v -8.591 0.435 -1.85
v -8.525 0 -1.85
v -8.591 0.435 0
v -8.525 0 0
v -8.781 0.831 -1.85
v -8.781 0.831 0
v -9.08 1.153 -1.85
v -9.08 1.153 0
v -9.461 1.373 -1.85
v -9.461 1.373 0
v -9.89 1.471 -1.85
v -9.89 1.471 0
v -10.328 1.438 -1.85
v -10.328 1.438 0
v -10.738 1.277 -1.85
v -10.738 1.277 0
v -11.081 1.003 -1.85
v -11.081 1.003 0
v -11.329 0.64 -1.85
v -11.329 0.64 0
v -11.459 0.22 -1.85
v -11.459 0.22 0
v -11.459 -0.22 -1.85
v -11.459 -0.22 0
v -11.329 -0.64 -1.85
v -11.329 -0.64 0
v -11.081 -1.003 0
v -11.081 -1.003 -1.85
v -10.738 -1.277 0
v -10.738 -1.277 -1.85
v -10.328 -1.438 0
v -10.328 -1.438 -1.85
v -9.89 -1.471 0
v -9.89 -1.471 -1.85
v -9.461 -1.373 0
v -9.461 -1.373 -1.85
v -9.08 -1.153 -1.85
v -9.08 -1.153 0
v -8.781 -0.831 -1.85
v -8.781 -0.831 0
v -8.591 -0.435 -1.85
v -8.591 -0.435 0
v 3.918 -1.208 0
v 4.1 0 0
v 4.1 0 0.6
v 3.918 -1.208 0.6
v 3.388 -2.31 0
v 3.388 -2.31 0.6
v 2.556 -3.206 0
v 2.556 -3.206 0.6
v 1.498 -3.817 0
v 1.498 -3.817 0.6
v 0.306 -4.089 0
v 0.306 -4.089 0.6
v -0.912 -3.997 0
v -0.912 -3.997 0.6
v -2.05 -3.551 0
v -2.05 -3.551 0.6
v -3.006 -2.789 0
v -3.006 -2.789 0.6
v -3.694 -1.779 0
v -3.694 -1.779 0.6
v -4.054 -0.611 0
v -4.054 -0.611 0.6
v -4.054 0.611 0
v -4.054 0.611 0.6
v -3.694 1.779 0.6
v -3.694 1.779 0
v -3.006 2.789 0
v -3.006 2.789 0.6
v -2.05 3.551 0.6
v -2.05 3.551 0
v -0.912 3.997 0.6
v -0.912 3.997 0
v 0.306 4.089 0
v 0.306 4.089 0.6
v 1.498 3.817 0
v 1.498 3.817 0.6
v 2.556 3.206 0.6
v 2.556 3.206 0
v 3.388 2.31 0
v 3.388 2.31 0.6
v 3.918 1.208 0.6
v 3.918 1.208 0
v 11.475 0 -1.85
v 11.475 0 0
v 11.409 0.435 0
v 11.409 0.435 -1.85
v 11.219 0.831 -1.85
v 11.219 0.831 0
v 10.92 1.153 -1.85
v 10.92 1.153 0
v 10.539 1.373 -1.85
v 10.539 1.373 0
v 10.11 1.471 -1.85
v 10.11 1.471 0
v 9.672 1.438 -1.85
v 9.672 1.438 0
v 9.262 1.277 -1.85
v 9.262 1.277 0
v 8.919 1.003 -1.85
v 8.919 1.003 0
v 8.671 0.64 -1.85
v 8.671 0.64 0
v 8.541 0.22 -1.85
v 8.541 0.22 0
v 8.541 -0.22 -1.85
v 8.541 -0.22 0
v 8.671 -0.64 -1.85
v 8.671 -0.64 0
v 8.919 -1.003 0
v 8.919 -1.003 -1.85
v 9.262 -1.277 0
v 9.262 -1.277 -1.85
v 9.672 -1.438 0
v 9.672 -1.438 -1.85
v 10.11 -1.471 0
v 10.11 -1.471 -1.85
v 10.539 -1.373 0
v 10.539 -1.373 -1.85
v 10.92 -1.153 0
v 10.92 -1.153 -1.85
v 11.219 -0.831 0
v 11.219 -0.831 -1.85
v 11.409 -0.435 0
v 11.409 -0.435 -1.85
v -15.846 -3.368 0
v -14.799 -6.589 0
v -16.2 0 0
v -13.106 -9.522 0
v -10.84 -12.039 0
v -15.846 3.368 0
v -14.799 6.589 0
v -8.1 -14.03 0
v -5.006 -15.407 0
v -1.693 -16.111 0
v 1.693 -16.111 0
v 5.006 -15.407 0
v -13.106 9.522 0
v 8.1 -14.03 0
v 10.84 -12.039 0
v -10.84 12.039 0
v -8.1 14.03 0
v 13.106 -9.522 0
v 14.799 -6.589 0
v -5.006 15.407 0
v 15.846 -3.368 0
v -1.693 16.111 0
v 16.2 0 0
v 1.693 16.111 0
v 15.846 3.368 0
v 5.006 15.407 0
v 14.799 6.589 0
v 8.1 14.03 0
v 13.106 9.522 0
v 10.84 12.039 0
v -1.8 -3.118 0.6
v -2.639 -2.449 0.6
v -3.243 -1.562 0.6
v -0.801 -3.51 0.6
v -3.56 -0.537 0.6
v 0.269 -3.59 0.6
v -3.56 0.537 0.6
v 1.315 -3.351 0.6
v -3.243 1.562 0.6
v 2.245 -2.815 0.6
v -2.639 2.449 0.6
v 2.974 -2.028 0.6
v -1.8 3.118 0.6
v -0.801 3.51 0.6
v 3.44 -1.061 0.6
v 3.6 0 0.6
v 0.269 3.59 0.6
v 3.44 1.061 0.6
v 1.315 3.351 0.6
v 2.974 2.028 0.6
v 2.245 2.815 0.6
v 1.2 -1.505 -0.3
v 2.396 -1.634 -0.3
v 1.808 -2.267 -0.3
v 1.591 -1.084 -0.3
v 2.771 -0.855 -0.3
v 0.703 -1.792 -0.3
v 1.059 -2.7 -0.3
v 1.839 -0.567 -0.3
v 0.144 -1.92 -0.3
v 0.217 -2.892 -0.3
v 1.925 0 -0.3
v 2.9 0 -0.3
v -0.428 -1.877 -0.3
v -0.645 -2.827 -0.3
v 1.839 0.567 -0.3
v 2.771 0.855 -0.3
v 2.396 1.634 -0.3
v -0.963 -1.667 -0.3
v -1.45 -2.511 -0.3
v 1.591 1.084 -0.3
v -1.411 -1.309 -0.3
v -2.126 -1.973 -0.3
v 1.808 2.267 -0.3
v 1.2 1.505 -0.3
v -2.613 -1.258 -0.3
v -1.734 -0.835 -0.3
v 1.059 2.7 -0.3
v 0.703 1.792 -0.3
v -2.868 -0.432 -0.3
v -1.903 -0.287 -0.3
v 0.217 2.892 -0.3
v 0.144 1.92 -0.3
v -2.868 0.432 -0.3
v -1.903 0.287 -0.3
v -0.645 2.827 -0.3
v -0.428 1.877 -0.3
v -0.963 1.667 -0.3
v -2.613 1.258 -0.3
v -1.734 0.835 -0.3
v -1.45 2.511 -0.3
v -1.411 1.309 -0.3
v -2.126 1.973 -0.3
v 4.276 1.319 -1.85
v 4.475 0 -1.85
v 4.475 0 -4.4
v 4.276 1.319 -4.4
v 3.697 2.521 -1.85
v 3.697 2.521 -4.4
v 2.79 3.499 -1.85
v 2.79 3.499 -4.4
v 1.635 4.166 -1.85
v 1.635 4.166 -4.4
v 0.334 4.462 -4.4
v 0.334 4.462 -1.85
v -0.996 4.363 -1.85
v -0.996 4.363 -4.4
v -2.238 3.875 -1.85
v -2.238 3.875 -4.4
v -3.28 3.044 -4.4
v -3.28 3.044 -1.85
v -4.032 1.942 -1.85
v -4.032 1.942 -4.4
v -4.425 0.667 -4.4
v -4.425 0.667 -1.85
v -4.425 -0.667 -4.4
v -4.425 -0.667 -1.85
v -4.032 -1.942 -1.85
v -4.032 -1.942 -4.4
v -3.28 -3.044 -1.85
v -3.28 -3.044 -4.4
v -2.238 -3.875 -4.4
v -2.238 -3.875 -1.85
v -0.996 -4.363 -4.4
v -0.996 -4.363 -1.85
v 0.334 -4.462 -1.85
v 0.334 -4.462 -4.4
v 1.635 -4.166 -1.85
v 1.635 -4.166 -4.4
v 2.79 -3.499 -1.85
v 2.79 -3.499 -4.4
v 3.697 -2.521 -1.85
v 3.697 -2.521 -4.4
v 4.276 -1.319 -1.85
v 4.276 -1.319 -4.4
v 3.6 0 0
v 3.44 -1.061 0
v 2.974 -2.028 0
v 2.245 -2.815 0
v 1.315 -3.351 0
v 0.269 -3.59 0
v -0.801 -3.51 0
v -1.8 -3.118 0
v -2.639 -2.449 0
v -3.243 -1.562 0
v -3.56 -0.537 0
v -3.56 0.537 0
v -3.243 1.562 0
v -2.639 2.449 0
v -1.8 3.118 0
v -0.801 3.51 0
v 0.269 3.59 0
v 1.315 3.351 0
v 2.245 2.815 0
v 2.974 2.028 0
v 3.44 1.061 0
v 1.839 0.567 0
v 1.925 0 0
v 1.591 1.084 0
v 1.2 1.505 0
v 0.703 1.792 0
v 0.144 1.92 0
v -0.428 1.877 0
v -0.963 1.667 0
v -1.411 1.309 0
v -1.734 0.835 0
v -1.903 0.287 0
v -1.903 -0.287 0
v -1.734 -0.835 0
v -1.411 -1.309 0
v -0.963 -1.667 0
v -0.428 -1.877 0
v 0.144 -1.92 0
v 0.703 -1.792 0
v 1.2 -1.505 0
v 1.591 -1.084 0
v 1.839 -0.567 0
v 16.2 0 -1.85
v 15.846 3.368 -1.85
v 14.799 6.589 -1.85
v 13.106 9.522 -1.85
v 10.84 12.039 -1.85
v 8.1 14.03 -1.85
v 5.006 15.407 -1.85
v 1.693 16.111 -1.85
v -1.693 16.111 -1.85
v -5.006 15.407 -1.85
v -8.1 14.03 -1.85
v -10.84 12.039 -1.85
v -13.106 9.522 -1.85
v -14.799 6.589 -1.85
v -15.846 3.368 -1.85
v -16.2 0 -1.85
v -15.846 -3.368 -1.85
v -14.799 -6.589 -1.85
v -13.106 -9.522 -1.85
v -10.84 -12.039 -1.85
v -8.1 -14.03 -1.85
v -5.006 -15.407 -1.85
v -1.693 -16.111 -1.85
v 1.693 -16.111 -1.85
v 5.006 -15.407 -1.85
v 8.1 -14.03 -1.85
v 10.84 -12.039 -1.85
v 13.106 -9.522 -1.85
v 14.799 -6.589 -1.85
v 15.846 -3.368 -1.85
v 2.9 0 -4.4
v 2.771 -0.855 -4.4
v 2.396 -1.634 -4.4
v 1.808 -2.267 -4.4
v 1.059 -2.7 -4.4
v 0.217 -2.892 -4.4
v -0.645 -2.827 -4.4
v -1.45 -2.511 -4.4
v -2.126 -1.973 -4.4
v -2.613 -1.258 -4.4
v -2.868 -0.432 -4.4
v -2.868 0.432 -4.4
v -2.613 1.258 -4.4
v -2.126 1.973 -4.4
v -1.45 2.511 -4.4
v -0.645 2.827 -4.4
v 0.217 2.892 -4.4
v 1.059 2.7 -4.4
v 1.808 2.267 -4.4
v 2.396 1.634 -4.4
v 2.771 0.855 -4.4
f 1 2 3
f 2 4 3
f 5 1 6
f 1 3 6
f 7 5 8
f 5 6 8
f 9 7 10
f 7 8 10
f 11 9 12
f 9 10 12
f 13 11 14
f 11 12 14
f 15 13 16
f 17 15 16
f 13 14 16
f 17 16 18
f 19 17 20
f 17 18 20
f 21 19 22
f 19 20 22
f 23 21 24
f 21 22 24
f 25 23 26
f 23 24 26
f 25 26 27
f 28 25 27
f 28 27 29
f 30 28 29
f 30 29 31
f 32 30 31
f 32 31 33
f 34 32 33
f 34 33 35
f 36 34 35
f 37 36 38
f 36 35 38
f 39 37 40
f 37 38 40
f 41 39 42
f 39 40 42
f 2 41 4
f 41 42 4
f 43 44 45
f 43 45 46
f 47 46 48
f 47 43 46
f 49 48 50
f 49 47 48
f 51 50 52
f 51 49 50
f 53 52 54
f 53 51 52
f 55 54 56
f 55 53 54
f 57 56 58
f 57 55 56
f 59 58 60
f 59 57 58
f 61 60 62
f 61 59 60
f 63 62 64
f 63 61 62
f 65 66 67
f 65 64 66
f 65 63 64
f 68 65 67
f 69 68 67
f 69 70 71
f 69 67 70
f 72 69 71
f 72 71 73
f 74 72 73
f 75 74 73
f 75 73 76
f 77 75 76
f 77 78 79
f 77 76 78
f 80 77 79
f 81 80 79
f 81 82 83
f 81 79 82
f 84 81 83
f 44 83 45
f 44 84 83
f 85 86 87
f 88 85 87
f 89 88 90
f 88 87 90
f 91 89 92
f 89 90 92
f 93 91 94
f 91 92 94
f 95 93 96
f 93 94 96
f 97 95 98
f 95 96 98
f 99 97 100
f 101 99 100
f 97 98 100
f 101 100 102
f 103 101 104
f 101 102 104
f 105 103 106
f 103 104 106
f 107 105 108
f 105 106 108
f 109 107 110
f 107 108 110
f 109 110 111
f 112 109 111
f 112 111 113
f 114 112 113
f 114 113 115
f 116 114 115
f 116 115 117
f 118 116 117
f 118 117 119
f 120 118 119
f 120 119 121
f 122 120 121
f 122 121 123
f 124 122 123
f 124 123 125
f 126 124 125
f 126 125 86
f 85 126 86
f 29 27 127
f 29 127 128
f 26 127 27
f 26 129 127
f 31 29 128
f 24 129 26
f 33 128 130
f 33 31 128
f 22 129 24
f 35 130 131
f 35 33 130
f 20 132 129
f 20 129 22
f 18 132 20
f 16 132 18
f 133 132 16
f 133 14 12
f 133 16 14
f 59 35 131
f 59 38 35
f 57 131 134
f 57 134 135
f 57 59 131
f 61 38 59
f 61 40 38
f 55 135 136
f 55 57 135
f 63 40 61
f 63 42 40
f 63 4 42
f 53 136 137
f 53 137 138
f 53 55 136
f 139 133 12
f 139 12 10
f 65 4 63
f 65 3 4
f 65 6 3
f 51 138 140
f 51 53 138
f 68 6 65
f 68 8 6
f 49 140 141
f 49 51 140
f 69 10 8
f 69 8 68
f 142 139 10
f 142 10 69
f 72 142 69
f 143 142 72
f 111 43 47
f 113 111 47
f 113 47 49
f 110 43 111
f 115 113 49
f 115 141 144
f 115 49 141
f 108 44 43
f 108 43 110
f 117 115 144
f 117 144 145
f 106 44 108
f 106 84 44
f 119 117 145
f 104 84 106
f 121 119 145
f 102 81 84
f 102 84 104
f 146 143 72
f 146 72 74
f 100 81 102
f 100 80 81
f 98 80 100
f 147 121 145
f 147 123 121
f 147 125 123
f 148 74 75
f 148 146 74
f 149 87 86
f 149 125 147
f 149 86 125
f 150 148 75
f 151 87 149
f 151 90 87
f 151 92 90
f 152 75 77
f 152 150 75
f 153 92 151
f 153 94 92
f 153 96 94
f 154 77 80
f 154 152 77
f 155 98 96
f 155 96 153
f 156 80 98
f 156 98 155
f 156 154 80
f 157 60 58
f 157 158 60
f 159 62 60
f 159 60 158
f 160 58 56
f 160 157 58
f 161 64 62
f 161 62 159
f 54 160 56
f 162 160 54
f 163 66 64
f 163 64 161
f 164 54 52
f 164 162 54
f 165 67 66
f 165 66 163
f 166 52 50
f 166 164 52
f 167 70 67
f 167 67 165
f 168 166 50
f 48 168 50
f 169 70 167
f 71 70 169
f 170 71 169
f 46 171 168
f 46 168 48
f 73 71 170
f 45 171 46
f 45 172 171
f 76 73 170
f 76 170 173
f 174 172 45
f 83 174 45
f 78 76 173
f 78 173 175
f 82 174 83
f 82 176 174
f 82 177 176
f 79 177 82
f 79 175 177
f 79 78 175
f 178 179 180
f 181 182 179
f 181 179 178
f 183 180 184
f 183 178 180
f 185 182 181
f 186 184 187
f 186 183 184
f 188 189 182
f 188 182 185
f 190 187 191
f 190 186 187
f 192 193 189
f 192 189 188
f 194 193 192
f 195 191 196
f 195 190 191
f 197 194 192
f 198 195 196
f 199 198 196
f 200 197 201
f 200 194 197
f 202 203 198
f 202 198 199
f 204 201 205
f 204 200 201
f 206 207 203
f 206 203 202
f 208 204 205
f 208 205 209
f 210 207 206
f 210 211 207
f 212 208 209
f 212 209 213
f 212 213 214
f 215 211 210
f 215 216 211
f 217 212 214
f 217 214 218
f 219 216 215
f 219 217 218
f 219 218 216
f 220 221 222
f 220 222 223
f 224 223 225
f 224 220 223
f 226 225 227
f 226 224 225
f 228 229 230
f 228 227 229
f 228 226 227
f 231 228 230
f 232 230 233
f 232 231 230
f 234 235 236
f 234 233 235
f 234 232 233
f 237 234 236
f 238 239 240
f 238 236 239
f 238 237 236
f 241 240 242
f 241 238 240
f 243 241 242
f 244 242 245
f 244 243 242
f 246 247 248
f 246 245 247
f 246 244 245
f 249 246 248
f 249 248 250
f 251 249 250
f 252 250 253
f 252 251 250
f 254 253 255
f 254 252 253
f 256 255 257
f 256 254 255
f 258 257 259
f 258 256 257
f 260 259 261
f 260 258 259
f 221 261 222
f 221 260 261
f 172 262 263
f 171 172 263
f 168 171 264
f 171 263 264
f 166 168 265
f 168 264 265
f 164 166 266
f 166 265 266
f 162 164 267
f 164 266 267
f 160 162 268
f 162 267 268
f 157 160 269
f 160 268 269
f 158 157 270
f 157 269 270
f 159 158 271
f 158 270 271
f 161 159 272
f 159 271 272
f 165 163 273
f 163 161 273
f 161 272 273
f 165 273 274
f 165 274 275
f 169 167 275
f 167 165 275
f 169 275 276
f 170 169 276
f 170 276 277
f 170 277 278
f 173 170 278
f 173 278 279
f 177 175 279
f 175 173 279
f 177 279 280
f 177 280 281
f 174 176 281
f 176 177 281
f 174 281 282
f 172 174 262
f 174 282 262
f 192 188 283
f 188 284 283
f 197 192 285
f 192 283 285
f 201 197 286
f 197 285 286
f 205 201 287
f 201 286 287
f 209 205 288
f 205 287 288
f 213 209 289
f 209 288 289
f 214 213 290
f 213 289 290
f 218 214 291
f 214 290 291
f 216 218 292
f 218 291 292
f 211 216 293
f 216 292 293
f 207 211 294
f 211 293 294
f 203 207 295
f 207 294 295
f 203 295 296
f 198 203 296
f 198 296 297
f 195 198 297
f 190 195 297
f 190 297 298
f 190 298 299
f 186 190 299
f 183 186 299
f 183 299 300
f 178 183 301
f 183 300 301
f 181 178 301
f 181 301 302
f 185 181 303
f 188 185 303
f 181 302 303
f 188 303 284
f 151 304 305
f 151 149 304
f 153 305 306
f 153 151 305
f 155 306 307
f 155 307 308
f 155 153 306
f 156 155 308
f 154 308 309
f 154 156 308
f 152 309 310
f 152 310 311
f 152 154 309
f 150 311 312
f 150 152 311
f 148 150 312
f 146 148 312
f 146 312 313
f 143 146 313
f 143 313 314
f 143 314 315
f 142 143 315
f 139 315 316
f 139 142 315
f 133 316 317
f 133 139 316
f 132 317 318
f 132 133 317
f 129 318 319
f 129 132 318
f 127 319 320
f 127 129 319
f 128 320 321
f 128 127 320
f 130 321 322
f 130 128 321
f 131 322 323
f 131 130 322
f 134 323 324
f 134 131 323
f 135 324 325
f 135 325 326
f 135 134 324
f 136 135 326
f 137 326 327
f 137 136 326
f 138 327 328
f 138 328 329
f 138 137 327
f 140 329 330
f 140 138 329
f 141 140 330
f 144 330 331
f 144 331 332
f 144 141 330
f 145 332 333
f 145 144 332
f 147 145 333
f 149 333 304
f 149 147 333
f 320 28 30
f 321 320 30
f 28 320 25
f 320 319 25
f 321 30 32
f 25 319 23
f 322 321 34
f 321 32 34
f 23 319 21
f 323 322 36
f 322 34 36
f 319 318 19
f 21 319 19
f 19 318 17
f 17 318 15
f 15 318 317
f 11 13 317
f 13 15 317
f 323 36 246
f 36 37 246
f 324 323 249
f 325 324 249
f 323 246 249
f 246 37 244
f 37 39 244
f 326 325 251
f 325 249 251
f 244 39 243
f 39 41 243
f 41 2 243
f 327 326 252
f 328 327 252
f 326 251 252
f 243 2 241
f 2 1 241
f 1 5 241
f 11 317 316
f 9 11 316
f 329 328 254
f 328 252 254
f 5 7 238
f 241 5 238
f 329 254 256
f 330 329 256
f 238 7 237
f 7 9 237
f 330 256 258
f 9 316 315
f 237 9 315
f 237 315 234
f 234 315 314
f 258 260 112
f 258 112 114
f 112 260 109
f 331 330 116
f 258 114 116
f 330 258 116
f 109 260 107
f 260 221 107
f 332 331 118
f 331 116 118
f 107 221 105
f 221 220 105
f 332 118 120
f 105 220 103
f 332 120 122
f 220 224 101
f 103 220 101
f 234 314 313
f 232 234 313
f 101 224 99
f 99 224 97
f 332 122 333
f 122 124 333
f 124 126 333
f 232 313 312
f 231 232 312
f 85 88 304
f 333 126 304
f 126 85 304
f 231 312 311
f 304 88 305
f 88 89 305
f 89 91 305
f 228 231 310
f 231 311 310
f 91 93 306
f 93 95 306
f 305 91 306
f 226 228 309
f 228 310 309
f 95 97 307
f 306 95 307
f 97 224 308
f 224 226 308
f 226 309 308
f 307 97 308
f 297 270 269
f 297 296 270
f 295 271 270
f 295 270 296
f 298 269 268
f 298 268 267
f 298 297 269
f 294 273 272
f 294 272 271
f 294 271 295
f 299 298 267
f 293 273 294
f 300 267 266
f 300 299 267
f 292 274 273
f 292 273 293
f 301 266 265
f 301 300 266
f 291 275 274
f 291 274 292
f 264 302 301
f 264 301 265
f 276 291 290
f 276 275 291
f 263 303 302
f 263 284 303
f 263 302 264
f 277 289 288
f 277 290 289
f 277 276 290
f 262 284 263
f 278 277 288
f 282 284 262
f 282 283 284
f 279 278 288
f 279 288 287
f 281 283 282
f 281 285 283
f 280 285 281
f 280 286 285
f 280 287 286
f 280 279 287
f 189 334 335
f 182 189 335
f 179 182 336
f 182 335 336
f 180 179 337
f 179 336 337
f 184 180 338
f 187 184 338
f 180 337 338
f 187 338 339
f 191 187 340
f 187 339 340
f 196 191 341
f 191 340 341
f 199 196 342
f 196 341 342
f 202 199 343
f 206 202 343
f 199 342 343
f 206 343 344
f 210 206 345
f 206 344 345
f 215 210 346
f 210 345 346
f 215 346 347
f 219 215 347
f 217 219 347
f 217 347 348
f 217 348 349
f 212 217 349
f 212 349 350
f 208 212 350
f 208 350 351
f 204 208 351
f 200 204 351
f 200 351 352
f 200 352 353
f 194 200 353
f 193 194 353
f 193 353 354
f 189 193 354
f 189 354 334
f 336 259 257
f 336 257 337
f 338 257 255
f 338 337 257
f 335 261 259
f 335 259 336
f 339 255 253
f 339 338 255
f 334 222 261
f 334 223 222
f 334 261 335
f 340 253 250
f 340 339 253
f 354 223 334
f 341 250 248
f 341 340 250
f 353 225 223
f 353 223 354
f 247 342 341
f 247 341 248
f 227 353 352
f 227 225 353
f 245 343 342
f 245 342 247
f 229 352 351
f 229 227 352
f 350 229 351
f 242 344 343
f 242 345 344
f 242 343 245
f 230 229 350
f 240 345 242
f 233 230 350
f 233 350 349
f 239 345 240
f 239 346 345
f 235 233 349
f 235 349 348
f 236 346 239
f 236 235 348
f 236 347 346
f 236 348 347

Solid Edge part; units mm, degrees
sketch "Sketch1" plane through (0, 0, 0) normal (0, 0, 1) x (1, 0, 0)
  circle A0 centre (0, 0) radius 16.2
extrude "Protrusion1" add sketch "Sketch1" against normal blind 1.85
sketch "Sketch2" plane through (0, 0, 0) normal (0, 0, 1) x (1, 0, 0)
  circle A0 centre (0, 0) radius 3.6
  circle A1 centre (0, 0) radius 4.1
  dimension "D1" = 7.2
extrude "ExtrudedProtrusion_2" add sketch "Sketch2" along normal blind 0.6
sketch "Sketch3" plane through (0, 0, -1.85) normal (0, 0, -1) x (1, 0, 0)
  circle A0 centre (0, 0) radius 4.475
extrude "ExtrudedProtrusion_3" add sketch "Sketch3" along normal blind 2.55
sketch "Sketch4" plane through (0, 0, -4.4) normal (0, 0, -1) x (1, 0, 0)
  circle A0 centre (0, 0) radius 2.9
extrude "ExtrudedCutout_1" cut sketch "Sketch4" against normal blind 4.1
sketch "Sketch5" plane through (0, 0, 0) normal (0, 0, 1) x (1, 0, 0)
  circle A0 centre (0, 0) radius 1.925
extrude "Cutout1" cut sketch "Sketch5" against normal through all
sketch "Sketch6" plane through (0, 0, 0) normal (0, 0, 1) x (1, 0, 0)
  circle A0 centre (-10, 0) radius 1.475
  circle A1 centre (10, 0) radius 1.475
  dimension "D1" = 2.95
  dimension "D2" = 20
extrude "Cutout2" cut sketch "Sketch6" against normal through all
